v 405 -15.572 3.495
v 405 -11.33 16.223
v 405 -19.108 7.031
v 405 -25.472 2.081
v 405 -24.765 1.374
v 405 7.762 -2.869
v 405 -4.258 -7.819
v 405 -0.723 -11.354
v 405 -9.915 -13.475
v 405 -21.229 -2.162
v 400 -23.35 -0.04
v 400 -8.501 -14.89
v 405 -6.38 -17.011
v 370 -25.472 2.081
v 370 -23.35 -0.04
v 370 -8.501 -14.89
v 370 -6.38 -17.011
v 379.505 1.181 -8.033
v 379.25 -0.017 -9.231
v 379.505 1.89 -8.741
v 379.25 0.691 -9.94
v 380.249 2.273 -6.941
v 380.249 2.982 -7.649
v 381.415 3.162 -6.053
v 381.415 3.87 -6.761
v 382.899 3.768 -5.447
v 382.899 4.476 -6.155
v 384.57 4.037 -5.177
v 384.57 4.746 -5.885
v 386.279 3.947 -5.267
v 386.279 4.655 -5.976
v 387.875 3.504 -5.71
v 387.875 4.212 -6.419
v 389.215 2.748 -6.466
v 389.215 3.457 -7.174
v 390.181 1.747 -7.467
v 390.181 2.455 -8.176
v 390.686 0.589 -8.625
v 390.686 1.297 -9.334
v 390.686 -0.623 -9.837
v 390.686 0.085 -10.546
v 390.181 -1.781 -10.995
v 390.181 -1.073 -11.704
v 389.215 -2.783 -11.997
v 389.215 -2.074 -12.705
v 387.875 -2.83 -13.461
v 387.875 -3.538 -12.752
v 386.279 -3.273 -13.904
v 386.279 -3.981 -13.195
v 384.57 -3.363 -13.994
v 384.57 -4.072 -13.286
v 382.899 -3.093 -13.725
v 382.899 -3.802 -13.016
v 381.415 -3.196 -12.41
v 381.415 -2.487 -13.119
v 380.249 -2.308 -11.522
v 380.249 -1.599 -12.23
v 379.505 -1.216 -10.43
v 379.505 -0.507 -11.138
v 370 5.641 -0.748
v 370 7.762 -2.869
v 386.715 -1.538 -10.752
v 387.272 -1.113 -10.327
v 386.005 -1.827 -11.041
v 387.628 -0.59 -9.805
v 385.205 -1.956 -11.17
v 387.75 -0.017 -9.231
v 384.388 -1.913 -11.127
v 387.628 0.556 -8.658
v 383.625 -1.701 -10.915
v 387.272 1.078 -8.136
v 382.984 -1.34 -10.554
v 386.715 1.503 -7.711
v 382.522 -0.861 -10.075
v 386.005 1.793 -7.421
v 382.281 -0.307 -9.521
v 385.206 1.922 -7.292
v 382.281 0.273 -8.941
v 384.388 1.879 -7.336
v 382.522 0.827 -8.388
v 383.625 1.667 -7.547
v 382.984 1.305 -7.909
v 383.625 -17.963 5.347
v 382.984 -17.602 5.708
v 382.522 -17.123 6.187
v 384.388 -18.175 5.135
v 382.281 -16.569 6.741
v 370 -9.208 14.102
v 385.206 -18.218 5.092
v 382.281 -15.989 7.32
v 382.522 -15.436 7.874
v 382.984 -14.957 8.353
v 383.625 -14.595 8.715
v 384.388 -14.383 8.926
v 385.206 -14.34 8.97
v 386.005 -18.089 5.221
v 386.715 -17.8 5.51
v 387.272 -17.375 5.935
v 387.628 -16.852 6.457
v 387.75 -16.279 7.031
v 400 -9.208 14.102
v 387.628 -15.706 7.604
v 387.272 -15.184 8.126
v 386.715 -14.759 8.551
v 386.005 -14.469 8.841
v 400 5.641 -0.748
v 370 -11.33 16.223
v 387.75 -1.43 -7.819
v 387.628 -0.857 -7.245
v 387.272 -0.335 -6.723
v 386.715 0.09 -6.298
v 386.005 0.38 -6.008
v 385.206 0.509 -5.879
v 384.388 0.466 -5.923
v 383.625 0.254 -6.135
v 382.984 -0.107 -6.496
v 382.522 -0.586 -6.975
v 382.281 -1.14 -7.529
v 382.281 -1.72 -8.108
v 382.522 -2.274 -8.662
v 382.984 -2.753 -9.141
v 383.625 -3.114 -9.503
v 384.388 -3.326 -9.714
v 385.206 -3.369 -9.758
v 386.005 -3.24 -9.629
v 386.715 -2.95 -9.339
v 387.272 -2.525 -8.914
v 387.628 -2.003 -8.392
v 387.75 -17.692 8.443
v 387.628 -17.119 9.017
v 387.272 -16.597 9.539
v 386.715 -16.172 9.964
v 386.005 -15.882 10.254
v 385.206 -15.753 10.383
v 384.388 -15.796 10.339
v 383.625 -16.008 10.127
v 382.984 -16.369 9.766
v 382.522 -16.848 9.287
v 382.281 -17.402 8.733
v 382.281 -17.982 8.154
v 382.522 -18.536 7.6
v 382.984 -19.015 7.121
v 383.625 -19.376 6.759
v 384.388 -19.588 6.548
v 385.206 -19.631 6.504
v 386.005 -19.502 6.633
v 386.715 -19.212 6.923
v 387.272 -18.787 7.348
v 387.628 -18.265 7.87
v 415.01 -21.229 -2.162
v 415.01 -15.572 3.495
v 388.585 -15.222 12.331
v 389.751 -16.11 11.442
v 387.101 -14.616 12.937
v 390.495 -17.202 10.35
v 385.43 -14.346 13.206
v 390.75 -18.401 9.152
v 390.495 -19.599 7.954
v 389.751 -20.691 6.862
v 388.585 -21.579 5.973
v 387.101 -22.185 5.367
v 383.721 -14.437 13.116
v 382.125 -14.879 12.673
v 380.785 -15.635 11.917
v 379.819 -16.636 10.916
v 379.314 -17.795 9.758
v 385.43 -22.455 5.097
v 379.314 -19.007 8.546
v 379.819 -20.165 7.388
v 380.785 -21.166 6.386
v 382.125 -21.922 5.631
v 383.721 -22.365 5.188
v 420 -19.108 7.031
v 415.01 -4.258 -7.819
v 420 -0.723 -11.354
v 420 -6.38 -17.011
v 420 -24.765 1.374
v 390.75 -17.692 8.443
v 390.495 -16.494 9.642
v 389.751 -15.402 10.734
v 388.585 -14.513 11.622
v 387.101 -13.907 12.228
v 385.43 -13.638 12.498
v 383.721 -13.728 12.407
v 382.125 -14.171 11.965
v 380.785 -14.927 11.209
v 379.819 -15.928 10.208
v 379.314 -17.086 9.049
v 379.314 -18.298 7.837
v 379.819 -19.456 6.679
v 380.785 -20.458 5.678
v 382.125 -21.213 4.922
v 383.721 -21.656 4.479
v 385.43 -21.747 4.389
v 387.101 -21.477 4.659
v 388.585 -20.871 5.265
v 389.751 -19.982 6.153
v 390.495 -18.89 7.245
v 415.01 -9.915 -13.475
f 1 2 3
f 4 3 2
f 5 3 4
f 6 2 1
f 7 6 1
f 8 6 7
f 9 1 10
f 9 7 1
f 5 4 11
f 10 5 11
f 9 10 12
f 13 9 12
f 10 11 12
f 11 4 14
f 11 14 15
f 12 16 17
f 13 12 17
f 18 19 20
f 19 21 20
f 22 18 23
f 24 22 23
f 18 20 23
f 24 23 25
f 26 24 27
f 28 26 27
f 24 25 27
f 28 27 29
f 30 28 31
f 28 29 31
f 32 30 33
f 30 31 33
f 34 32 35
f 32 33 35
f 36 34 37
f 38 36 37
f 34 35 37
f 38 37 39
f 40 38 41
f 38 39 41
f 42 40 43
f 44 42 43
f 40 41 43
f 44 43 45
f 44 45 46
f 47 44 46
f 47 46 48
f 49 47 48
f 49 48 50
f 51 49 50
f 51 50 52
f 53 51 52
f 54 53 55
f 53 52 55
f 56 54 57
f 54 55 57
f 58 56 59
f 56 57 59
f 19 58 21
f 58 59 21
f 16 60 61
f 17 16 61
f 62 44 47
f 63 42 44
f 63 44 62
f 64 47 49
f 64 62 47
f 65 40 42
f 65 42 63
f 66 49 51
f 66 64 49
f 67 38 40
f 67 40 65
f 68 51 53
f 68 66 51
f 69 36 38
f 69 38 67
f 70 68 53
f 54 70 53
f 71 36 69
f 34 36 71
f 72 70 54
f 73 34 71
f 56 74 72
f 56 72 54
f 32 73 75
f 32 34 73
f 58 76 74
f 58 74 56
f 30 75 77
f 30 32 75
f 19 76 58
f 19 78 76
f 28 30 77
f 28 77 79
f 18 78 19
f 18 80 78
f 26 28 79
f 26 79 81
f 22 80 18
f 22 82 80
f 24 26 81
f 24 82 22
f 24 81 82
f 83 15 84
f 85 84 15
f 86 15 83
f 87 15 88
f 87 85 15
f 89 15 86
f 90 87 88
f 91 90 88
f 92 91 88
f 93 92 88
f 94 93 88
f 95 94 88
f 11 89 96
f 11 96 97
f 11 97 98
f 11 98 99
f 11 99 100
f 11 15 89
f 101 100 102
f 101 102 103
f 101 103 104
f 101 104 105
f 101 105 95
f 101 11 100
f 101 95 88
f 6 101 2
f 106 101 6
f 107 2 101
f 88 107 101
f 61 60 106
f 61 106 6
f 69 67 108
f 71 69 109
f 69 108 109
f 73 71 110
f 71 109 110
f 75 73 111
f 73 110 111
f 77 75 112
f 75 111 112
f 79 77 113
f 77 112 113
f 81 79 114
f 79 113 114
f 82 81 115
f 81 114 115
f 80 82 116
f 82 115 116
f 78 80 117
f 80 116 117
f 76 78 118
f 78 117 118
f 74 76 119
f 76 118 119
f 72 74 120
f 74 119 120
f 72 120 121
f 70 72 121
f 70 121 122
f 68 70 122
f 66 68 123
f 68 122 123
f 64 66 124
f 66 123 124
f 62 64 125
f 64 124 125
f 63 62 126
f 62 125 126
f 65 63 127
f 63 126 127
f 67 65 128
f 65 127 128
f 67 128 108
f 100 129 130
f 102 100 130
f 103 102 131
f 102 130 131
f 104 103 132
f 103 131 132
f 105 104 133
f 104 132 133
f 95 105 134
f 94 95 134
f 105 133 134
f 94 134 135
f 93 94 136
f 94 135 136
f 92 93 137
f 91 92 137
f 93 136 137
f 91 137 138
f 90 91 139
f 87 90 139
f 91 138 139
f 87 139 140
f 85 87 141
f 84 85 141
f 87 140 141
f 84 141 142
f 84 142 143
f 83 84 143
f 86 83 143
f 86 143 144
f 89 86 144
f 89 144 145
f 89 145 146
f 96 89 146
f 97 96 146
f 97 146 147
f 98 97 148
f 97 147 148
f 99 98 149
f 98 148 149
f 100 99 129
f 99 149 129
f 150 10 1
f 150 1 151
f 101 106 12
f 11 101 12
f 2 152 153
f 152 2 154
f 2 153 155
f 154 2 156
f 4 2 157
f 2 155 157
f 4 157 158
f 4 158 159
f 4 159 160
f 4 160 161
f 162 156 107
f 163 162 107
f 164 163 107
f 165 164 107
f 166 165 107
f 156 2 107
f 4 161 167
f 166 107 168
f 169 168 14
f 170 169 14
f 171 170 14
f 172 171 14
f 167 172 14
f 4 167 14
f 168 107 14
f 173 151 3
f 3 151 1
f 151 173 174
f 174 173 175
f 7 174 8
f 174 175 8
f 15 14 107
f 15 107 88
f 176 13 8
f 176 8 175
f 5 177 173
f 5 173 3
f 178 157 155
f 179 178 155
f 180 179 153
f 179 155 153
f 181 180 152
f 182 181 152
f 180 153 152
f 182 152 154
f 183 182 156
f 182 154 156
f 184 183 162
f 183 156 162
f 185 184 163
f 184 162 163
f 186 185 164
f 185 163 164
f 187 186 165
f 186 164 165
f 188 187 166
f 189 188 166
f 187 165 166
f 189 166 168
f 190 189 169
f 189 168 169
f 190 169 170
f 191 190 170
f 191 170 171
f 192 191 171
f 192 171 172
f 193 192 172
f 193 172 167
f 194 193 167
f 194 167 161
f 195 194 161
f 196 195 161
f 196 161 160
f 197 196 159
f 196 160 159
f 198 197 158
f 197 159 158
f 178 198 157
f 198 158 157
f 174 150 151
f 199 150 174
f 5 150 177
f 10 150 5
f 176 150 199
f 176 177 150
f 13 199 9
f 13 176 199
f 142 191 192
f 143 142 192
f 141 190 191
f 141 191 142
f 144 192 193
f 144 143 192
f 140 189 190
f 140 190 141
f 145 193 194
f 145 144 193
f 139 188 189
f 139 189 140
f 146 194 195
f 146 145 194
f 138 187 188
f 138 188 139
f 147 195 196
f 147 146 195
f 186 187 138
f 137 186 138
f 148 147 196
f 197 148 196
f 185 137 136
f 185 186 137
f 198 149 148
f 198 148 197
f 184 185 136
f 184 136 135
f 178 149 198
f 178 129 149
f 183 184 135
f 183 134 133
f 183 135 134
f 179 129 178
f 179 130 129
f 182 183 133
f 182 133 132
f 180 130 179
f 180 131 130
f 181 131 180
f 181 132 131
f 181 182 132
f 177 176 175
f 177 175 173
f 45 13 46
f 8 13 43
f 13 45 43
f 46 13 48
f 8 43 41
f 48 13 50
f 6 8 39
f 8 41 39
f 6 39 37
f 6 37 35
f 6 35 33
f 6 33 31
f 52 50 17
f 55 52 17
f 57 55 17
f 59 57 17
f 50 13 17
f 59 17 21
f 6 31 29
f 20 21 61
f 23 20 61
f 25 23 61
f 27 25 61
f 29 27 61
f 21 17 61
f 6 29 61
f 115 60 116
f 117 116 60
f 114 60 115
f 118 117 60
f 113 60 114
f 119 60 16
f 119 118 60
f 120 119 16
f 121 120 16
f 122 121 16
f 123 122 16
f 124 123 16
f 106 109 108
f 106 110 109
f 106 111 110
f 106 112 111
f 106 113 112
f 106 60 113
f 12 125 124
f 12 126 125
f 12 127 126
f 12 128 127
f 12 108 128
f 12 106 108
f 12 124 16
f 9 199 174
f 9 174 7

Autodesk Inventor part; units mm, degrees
ref_plane "YZ Plane" through (0, 0, 0) normal (1, 0, 0) x (0, 1, 0)
ref_plane "XZ Plane" through (0, 0, 0) normal (0, 1, 0) x (-1, 0, 0)
ref_plane "XY Plane" through (0, 0, 0) normal (0, 0, 1) x (1, 0, 0)
ref_plane "Work Plane1" through (400, -8.5282, -0.75) normal (1, 0, 0) x (0, 0.7071068, -0.7071068)
sketch "Sketch1" plane through (400, -8.5282, -0.75) normal (1, 0, 0) x (0, 0.7071068, -0.7071068)
  line L0 (-10.9826, 10.0209) -> (10.0174, 10.0209)
  line L1 (10.0174, 10.0209) -> (10.0174, -9.9791)
  line L2 (10.0174, -9.9791) -> (-10.9826, -9.9791)
  line L3 (-10.9826, -9.9791) -> (-10.9826, 10.0209)
  line L4 (10.0174, 10.0209) -> (13.0174, 10.0209)
  line L5 (13.0174, 10.0209) -> (13.0174, -9.9791)
  line L6 (13.0174, -9.9791) -> (10.0174, -9.9791)
  line L7 (10.0174, -9.9791) -> (10.0174, 10.0209)
  line L8 (-10.9826, 10.0209) -> (-13.9826, 10.0209)
  line L9 (-13.9826, 10.0209) -> (-13.9826, -9.9791)
  line L10 (-13.9826, -9.9791) -> (-10.9826, -9.9791)
  line L11 (-10.9826, -9.9791) -> (-10.9826, 10.0209)
  point P0 (5.5, 6.5607)
  point P1 (10.0174, -9.9791)
  point P2 (-10.9826, -9.9791)
  dimension "d0" = 21
  dimension "d1" = 20
  dimension "d2" = 3
  dimension "d3" = 20
  dimension "d4" = 3
  dimension "d5" = 20
extrude "Extrusion1" add sketch "Sketch1" against normal blind 30 contours L3 L10 L9 L8 | L4 L5 L6 L1
sketch "Sketch2" plane through (400, -8.5282, -0.75) normal (1, 0, 0) x (0, -0.7071068, -0.7071068)
  line L0 (-10.0209, -13.9826) -> (-10.0209, -10.9826) projected
  line L1 (9.9791, 13.0174) -> (9.9791, 10.0174) projected
  line L2 (-10.0209, -13.9826) -> (9.9791, -13.9826)
  line L3 (9.9791, -13.9826) -> (9.9791, 13.0174)
  line L4 (9.9791, 13.0174) -> (-10.0209, 13.0174)
  line L5 (-10.0209, 13.0174) -> (-10.0209, -13.9826)
  point P0 (-6.5607, 5.5)
extrude "Extrusion2" add sketch "Sketch2" along normal blind 5
sketch "Sketch3" plane through (405, -6.3798, -17.011) normal (0, -0.7071068, -0.7071068) x (-1, 0, 0)
  line L0 (35, 0) -> (0, 0) projected
  line L1 (0, 0) -> (-15, 0)
  line L2 (-15, 0) -> (-15, -26)
  line L3 (-15, -26) -> (0, -26)
  line L4 (0, -26) -> (0, 0)
  line L5 (-10.0102, -5) -> (0, -5)
  line L6 (0, -5) -> (0, -21)
  line L7 (0, -21) -> (-10.0102, -21)
  line L8 (-10.0102, -21) -> (-10.0102, -5)
  point P0 (405, -7.5174)
  point P1 (0, -21)
  point P2 (0, -5)
  dimension "d10" = 15
  dimension "d11" = 26
  dimension "d12" = 0
  dimension "d13" = 5
  dimension "d14" = 16
extrude "Extrusion3" add sketch "Sketch3" against normal blind 8 contours L4 L5 L8 L7 L3 L2 L1
sketch "Sketch4" plane through (370, -11.3295, 16.223) normal (0, -0.7071068, 0.7071068) x (1, 0, 0)
  circle A0 centre (15, -10) radius 2.75
  line L0 (0, -20) -> (50, -20) projected
  line L1 (0, -20) -> (0, 0) projected
  point P0 (-370, -3.4602)
  dimension "d17" = 5.5
  dimension "d18" = 10
  dimension "d19" = 15
extrude "Extrusion4" cut sketch "Sketch4" against normal through all
sketch "Sketch5" plane through (370, -11.3295, 16.223) normal (0, -0.7071068, 0.7071068) x (1, 0, 0)
  circle A0 centre (15, -10) radius 2.75 projected
  circle A1 centre (15, -10) radius 5.75
  point P0 (-370, -3.4602)
  dimension "d22" = 11.5
extrude "Extrusion5" cut sketch "Sketch5" against normal blind 1 contours A0 | A1
sketch "Sketch6" plane through (405, 7.7624, -2.8688) normal (0, 0.7071068, -0.7071068) x (-1, 0, 0)
  circle A0 centre (20, -10) radius 2.75 projected
  circle A1 centre (20, -10) radius 5.75
  point P0 (405, -3.4602)
  dimension "d25" = 11.5
extrude "Extrusion6" cut sketch "Sketch6" against normal blind 1
equation "\"d14\" = d11 - 2 * d13"
properties part number "StrapHolder"
